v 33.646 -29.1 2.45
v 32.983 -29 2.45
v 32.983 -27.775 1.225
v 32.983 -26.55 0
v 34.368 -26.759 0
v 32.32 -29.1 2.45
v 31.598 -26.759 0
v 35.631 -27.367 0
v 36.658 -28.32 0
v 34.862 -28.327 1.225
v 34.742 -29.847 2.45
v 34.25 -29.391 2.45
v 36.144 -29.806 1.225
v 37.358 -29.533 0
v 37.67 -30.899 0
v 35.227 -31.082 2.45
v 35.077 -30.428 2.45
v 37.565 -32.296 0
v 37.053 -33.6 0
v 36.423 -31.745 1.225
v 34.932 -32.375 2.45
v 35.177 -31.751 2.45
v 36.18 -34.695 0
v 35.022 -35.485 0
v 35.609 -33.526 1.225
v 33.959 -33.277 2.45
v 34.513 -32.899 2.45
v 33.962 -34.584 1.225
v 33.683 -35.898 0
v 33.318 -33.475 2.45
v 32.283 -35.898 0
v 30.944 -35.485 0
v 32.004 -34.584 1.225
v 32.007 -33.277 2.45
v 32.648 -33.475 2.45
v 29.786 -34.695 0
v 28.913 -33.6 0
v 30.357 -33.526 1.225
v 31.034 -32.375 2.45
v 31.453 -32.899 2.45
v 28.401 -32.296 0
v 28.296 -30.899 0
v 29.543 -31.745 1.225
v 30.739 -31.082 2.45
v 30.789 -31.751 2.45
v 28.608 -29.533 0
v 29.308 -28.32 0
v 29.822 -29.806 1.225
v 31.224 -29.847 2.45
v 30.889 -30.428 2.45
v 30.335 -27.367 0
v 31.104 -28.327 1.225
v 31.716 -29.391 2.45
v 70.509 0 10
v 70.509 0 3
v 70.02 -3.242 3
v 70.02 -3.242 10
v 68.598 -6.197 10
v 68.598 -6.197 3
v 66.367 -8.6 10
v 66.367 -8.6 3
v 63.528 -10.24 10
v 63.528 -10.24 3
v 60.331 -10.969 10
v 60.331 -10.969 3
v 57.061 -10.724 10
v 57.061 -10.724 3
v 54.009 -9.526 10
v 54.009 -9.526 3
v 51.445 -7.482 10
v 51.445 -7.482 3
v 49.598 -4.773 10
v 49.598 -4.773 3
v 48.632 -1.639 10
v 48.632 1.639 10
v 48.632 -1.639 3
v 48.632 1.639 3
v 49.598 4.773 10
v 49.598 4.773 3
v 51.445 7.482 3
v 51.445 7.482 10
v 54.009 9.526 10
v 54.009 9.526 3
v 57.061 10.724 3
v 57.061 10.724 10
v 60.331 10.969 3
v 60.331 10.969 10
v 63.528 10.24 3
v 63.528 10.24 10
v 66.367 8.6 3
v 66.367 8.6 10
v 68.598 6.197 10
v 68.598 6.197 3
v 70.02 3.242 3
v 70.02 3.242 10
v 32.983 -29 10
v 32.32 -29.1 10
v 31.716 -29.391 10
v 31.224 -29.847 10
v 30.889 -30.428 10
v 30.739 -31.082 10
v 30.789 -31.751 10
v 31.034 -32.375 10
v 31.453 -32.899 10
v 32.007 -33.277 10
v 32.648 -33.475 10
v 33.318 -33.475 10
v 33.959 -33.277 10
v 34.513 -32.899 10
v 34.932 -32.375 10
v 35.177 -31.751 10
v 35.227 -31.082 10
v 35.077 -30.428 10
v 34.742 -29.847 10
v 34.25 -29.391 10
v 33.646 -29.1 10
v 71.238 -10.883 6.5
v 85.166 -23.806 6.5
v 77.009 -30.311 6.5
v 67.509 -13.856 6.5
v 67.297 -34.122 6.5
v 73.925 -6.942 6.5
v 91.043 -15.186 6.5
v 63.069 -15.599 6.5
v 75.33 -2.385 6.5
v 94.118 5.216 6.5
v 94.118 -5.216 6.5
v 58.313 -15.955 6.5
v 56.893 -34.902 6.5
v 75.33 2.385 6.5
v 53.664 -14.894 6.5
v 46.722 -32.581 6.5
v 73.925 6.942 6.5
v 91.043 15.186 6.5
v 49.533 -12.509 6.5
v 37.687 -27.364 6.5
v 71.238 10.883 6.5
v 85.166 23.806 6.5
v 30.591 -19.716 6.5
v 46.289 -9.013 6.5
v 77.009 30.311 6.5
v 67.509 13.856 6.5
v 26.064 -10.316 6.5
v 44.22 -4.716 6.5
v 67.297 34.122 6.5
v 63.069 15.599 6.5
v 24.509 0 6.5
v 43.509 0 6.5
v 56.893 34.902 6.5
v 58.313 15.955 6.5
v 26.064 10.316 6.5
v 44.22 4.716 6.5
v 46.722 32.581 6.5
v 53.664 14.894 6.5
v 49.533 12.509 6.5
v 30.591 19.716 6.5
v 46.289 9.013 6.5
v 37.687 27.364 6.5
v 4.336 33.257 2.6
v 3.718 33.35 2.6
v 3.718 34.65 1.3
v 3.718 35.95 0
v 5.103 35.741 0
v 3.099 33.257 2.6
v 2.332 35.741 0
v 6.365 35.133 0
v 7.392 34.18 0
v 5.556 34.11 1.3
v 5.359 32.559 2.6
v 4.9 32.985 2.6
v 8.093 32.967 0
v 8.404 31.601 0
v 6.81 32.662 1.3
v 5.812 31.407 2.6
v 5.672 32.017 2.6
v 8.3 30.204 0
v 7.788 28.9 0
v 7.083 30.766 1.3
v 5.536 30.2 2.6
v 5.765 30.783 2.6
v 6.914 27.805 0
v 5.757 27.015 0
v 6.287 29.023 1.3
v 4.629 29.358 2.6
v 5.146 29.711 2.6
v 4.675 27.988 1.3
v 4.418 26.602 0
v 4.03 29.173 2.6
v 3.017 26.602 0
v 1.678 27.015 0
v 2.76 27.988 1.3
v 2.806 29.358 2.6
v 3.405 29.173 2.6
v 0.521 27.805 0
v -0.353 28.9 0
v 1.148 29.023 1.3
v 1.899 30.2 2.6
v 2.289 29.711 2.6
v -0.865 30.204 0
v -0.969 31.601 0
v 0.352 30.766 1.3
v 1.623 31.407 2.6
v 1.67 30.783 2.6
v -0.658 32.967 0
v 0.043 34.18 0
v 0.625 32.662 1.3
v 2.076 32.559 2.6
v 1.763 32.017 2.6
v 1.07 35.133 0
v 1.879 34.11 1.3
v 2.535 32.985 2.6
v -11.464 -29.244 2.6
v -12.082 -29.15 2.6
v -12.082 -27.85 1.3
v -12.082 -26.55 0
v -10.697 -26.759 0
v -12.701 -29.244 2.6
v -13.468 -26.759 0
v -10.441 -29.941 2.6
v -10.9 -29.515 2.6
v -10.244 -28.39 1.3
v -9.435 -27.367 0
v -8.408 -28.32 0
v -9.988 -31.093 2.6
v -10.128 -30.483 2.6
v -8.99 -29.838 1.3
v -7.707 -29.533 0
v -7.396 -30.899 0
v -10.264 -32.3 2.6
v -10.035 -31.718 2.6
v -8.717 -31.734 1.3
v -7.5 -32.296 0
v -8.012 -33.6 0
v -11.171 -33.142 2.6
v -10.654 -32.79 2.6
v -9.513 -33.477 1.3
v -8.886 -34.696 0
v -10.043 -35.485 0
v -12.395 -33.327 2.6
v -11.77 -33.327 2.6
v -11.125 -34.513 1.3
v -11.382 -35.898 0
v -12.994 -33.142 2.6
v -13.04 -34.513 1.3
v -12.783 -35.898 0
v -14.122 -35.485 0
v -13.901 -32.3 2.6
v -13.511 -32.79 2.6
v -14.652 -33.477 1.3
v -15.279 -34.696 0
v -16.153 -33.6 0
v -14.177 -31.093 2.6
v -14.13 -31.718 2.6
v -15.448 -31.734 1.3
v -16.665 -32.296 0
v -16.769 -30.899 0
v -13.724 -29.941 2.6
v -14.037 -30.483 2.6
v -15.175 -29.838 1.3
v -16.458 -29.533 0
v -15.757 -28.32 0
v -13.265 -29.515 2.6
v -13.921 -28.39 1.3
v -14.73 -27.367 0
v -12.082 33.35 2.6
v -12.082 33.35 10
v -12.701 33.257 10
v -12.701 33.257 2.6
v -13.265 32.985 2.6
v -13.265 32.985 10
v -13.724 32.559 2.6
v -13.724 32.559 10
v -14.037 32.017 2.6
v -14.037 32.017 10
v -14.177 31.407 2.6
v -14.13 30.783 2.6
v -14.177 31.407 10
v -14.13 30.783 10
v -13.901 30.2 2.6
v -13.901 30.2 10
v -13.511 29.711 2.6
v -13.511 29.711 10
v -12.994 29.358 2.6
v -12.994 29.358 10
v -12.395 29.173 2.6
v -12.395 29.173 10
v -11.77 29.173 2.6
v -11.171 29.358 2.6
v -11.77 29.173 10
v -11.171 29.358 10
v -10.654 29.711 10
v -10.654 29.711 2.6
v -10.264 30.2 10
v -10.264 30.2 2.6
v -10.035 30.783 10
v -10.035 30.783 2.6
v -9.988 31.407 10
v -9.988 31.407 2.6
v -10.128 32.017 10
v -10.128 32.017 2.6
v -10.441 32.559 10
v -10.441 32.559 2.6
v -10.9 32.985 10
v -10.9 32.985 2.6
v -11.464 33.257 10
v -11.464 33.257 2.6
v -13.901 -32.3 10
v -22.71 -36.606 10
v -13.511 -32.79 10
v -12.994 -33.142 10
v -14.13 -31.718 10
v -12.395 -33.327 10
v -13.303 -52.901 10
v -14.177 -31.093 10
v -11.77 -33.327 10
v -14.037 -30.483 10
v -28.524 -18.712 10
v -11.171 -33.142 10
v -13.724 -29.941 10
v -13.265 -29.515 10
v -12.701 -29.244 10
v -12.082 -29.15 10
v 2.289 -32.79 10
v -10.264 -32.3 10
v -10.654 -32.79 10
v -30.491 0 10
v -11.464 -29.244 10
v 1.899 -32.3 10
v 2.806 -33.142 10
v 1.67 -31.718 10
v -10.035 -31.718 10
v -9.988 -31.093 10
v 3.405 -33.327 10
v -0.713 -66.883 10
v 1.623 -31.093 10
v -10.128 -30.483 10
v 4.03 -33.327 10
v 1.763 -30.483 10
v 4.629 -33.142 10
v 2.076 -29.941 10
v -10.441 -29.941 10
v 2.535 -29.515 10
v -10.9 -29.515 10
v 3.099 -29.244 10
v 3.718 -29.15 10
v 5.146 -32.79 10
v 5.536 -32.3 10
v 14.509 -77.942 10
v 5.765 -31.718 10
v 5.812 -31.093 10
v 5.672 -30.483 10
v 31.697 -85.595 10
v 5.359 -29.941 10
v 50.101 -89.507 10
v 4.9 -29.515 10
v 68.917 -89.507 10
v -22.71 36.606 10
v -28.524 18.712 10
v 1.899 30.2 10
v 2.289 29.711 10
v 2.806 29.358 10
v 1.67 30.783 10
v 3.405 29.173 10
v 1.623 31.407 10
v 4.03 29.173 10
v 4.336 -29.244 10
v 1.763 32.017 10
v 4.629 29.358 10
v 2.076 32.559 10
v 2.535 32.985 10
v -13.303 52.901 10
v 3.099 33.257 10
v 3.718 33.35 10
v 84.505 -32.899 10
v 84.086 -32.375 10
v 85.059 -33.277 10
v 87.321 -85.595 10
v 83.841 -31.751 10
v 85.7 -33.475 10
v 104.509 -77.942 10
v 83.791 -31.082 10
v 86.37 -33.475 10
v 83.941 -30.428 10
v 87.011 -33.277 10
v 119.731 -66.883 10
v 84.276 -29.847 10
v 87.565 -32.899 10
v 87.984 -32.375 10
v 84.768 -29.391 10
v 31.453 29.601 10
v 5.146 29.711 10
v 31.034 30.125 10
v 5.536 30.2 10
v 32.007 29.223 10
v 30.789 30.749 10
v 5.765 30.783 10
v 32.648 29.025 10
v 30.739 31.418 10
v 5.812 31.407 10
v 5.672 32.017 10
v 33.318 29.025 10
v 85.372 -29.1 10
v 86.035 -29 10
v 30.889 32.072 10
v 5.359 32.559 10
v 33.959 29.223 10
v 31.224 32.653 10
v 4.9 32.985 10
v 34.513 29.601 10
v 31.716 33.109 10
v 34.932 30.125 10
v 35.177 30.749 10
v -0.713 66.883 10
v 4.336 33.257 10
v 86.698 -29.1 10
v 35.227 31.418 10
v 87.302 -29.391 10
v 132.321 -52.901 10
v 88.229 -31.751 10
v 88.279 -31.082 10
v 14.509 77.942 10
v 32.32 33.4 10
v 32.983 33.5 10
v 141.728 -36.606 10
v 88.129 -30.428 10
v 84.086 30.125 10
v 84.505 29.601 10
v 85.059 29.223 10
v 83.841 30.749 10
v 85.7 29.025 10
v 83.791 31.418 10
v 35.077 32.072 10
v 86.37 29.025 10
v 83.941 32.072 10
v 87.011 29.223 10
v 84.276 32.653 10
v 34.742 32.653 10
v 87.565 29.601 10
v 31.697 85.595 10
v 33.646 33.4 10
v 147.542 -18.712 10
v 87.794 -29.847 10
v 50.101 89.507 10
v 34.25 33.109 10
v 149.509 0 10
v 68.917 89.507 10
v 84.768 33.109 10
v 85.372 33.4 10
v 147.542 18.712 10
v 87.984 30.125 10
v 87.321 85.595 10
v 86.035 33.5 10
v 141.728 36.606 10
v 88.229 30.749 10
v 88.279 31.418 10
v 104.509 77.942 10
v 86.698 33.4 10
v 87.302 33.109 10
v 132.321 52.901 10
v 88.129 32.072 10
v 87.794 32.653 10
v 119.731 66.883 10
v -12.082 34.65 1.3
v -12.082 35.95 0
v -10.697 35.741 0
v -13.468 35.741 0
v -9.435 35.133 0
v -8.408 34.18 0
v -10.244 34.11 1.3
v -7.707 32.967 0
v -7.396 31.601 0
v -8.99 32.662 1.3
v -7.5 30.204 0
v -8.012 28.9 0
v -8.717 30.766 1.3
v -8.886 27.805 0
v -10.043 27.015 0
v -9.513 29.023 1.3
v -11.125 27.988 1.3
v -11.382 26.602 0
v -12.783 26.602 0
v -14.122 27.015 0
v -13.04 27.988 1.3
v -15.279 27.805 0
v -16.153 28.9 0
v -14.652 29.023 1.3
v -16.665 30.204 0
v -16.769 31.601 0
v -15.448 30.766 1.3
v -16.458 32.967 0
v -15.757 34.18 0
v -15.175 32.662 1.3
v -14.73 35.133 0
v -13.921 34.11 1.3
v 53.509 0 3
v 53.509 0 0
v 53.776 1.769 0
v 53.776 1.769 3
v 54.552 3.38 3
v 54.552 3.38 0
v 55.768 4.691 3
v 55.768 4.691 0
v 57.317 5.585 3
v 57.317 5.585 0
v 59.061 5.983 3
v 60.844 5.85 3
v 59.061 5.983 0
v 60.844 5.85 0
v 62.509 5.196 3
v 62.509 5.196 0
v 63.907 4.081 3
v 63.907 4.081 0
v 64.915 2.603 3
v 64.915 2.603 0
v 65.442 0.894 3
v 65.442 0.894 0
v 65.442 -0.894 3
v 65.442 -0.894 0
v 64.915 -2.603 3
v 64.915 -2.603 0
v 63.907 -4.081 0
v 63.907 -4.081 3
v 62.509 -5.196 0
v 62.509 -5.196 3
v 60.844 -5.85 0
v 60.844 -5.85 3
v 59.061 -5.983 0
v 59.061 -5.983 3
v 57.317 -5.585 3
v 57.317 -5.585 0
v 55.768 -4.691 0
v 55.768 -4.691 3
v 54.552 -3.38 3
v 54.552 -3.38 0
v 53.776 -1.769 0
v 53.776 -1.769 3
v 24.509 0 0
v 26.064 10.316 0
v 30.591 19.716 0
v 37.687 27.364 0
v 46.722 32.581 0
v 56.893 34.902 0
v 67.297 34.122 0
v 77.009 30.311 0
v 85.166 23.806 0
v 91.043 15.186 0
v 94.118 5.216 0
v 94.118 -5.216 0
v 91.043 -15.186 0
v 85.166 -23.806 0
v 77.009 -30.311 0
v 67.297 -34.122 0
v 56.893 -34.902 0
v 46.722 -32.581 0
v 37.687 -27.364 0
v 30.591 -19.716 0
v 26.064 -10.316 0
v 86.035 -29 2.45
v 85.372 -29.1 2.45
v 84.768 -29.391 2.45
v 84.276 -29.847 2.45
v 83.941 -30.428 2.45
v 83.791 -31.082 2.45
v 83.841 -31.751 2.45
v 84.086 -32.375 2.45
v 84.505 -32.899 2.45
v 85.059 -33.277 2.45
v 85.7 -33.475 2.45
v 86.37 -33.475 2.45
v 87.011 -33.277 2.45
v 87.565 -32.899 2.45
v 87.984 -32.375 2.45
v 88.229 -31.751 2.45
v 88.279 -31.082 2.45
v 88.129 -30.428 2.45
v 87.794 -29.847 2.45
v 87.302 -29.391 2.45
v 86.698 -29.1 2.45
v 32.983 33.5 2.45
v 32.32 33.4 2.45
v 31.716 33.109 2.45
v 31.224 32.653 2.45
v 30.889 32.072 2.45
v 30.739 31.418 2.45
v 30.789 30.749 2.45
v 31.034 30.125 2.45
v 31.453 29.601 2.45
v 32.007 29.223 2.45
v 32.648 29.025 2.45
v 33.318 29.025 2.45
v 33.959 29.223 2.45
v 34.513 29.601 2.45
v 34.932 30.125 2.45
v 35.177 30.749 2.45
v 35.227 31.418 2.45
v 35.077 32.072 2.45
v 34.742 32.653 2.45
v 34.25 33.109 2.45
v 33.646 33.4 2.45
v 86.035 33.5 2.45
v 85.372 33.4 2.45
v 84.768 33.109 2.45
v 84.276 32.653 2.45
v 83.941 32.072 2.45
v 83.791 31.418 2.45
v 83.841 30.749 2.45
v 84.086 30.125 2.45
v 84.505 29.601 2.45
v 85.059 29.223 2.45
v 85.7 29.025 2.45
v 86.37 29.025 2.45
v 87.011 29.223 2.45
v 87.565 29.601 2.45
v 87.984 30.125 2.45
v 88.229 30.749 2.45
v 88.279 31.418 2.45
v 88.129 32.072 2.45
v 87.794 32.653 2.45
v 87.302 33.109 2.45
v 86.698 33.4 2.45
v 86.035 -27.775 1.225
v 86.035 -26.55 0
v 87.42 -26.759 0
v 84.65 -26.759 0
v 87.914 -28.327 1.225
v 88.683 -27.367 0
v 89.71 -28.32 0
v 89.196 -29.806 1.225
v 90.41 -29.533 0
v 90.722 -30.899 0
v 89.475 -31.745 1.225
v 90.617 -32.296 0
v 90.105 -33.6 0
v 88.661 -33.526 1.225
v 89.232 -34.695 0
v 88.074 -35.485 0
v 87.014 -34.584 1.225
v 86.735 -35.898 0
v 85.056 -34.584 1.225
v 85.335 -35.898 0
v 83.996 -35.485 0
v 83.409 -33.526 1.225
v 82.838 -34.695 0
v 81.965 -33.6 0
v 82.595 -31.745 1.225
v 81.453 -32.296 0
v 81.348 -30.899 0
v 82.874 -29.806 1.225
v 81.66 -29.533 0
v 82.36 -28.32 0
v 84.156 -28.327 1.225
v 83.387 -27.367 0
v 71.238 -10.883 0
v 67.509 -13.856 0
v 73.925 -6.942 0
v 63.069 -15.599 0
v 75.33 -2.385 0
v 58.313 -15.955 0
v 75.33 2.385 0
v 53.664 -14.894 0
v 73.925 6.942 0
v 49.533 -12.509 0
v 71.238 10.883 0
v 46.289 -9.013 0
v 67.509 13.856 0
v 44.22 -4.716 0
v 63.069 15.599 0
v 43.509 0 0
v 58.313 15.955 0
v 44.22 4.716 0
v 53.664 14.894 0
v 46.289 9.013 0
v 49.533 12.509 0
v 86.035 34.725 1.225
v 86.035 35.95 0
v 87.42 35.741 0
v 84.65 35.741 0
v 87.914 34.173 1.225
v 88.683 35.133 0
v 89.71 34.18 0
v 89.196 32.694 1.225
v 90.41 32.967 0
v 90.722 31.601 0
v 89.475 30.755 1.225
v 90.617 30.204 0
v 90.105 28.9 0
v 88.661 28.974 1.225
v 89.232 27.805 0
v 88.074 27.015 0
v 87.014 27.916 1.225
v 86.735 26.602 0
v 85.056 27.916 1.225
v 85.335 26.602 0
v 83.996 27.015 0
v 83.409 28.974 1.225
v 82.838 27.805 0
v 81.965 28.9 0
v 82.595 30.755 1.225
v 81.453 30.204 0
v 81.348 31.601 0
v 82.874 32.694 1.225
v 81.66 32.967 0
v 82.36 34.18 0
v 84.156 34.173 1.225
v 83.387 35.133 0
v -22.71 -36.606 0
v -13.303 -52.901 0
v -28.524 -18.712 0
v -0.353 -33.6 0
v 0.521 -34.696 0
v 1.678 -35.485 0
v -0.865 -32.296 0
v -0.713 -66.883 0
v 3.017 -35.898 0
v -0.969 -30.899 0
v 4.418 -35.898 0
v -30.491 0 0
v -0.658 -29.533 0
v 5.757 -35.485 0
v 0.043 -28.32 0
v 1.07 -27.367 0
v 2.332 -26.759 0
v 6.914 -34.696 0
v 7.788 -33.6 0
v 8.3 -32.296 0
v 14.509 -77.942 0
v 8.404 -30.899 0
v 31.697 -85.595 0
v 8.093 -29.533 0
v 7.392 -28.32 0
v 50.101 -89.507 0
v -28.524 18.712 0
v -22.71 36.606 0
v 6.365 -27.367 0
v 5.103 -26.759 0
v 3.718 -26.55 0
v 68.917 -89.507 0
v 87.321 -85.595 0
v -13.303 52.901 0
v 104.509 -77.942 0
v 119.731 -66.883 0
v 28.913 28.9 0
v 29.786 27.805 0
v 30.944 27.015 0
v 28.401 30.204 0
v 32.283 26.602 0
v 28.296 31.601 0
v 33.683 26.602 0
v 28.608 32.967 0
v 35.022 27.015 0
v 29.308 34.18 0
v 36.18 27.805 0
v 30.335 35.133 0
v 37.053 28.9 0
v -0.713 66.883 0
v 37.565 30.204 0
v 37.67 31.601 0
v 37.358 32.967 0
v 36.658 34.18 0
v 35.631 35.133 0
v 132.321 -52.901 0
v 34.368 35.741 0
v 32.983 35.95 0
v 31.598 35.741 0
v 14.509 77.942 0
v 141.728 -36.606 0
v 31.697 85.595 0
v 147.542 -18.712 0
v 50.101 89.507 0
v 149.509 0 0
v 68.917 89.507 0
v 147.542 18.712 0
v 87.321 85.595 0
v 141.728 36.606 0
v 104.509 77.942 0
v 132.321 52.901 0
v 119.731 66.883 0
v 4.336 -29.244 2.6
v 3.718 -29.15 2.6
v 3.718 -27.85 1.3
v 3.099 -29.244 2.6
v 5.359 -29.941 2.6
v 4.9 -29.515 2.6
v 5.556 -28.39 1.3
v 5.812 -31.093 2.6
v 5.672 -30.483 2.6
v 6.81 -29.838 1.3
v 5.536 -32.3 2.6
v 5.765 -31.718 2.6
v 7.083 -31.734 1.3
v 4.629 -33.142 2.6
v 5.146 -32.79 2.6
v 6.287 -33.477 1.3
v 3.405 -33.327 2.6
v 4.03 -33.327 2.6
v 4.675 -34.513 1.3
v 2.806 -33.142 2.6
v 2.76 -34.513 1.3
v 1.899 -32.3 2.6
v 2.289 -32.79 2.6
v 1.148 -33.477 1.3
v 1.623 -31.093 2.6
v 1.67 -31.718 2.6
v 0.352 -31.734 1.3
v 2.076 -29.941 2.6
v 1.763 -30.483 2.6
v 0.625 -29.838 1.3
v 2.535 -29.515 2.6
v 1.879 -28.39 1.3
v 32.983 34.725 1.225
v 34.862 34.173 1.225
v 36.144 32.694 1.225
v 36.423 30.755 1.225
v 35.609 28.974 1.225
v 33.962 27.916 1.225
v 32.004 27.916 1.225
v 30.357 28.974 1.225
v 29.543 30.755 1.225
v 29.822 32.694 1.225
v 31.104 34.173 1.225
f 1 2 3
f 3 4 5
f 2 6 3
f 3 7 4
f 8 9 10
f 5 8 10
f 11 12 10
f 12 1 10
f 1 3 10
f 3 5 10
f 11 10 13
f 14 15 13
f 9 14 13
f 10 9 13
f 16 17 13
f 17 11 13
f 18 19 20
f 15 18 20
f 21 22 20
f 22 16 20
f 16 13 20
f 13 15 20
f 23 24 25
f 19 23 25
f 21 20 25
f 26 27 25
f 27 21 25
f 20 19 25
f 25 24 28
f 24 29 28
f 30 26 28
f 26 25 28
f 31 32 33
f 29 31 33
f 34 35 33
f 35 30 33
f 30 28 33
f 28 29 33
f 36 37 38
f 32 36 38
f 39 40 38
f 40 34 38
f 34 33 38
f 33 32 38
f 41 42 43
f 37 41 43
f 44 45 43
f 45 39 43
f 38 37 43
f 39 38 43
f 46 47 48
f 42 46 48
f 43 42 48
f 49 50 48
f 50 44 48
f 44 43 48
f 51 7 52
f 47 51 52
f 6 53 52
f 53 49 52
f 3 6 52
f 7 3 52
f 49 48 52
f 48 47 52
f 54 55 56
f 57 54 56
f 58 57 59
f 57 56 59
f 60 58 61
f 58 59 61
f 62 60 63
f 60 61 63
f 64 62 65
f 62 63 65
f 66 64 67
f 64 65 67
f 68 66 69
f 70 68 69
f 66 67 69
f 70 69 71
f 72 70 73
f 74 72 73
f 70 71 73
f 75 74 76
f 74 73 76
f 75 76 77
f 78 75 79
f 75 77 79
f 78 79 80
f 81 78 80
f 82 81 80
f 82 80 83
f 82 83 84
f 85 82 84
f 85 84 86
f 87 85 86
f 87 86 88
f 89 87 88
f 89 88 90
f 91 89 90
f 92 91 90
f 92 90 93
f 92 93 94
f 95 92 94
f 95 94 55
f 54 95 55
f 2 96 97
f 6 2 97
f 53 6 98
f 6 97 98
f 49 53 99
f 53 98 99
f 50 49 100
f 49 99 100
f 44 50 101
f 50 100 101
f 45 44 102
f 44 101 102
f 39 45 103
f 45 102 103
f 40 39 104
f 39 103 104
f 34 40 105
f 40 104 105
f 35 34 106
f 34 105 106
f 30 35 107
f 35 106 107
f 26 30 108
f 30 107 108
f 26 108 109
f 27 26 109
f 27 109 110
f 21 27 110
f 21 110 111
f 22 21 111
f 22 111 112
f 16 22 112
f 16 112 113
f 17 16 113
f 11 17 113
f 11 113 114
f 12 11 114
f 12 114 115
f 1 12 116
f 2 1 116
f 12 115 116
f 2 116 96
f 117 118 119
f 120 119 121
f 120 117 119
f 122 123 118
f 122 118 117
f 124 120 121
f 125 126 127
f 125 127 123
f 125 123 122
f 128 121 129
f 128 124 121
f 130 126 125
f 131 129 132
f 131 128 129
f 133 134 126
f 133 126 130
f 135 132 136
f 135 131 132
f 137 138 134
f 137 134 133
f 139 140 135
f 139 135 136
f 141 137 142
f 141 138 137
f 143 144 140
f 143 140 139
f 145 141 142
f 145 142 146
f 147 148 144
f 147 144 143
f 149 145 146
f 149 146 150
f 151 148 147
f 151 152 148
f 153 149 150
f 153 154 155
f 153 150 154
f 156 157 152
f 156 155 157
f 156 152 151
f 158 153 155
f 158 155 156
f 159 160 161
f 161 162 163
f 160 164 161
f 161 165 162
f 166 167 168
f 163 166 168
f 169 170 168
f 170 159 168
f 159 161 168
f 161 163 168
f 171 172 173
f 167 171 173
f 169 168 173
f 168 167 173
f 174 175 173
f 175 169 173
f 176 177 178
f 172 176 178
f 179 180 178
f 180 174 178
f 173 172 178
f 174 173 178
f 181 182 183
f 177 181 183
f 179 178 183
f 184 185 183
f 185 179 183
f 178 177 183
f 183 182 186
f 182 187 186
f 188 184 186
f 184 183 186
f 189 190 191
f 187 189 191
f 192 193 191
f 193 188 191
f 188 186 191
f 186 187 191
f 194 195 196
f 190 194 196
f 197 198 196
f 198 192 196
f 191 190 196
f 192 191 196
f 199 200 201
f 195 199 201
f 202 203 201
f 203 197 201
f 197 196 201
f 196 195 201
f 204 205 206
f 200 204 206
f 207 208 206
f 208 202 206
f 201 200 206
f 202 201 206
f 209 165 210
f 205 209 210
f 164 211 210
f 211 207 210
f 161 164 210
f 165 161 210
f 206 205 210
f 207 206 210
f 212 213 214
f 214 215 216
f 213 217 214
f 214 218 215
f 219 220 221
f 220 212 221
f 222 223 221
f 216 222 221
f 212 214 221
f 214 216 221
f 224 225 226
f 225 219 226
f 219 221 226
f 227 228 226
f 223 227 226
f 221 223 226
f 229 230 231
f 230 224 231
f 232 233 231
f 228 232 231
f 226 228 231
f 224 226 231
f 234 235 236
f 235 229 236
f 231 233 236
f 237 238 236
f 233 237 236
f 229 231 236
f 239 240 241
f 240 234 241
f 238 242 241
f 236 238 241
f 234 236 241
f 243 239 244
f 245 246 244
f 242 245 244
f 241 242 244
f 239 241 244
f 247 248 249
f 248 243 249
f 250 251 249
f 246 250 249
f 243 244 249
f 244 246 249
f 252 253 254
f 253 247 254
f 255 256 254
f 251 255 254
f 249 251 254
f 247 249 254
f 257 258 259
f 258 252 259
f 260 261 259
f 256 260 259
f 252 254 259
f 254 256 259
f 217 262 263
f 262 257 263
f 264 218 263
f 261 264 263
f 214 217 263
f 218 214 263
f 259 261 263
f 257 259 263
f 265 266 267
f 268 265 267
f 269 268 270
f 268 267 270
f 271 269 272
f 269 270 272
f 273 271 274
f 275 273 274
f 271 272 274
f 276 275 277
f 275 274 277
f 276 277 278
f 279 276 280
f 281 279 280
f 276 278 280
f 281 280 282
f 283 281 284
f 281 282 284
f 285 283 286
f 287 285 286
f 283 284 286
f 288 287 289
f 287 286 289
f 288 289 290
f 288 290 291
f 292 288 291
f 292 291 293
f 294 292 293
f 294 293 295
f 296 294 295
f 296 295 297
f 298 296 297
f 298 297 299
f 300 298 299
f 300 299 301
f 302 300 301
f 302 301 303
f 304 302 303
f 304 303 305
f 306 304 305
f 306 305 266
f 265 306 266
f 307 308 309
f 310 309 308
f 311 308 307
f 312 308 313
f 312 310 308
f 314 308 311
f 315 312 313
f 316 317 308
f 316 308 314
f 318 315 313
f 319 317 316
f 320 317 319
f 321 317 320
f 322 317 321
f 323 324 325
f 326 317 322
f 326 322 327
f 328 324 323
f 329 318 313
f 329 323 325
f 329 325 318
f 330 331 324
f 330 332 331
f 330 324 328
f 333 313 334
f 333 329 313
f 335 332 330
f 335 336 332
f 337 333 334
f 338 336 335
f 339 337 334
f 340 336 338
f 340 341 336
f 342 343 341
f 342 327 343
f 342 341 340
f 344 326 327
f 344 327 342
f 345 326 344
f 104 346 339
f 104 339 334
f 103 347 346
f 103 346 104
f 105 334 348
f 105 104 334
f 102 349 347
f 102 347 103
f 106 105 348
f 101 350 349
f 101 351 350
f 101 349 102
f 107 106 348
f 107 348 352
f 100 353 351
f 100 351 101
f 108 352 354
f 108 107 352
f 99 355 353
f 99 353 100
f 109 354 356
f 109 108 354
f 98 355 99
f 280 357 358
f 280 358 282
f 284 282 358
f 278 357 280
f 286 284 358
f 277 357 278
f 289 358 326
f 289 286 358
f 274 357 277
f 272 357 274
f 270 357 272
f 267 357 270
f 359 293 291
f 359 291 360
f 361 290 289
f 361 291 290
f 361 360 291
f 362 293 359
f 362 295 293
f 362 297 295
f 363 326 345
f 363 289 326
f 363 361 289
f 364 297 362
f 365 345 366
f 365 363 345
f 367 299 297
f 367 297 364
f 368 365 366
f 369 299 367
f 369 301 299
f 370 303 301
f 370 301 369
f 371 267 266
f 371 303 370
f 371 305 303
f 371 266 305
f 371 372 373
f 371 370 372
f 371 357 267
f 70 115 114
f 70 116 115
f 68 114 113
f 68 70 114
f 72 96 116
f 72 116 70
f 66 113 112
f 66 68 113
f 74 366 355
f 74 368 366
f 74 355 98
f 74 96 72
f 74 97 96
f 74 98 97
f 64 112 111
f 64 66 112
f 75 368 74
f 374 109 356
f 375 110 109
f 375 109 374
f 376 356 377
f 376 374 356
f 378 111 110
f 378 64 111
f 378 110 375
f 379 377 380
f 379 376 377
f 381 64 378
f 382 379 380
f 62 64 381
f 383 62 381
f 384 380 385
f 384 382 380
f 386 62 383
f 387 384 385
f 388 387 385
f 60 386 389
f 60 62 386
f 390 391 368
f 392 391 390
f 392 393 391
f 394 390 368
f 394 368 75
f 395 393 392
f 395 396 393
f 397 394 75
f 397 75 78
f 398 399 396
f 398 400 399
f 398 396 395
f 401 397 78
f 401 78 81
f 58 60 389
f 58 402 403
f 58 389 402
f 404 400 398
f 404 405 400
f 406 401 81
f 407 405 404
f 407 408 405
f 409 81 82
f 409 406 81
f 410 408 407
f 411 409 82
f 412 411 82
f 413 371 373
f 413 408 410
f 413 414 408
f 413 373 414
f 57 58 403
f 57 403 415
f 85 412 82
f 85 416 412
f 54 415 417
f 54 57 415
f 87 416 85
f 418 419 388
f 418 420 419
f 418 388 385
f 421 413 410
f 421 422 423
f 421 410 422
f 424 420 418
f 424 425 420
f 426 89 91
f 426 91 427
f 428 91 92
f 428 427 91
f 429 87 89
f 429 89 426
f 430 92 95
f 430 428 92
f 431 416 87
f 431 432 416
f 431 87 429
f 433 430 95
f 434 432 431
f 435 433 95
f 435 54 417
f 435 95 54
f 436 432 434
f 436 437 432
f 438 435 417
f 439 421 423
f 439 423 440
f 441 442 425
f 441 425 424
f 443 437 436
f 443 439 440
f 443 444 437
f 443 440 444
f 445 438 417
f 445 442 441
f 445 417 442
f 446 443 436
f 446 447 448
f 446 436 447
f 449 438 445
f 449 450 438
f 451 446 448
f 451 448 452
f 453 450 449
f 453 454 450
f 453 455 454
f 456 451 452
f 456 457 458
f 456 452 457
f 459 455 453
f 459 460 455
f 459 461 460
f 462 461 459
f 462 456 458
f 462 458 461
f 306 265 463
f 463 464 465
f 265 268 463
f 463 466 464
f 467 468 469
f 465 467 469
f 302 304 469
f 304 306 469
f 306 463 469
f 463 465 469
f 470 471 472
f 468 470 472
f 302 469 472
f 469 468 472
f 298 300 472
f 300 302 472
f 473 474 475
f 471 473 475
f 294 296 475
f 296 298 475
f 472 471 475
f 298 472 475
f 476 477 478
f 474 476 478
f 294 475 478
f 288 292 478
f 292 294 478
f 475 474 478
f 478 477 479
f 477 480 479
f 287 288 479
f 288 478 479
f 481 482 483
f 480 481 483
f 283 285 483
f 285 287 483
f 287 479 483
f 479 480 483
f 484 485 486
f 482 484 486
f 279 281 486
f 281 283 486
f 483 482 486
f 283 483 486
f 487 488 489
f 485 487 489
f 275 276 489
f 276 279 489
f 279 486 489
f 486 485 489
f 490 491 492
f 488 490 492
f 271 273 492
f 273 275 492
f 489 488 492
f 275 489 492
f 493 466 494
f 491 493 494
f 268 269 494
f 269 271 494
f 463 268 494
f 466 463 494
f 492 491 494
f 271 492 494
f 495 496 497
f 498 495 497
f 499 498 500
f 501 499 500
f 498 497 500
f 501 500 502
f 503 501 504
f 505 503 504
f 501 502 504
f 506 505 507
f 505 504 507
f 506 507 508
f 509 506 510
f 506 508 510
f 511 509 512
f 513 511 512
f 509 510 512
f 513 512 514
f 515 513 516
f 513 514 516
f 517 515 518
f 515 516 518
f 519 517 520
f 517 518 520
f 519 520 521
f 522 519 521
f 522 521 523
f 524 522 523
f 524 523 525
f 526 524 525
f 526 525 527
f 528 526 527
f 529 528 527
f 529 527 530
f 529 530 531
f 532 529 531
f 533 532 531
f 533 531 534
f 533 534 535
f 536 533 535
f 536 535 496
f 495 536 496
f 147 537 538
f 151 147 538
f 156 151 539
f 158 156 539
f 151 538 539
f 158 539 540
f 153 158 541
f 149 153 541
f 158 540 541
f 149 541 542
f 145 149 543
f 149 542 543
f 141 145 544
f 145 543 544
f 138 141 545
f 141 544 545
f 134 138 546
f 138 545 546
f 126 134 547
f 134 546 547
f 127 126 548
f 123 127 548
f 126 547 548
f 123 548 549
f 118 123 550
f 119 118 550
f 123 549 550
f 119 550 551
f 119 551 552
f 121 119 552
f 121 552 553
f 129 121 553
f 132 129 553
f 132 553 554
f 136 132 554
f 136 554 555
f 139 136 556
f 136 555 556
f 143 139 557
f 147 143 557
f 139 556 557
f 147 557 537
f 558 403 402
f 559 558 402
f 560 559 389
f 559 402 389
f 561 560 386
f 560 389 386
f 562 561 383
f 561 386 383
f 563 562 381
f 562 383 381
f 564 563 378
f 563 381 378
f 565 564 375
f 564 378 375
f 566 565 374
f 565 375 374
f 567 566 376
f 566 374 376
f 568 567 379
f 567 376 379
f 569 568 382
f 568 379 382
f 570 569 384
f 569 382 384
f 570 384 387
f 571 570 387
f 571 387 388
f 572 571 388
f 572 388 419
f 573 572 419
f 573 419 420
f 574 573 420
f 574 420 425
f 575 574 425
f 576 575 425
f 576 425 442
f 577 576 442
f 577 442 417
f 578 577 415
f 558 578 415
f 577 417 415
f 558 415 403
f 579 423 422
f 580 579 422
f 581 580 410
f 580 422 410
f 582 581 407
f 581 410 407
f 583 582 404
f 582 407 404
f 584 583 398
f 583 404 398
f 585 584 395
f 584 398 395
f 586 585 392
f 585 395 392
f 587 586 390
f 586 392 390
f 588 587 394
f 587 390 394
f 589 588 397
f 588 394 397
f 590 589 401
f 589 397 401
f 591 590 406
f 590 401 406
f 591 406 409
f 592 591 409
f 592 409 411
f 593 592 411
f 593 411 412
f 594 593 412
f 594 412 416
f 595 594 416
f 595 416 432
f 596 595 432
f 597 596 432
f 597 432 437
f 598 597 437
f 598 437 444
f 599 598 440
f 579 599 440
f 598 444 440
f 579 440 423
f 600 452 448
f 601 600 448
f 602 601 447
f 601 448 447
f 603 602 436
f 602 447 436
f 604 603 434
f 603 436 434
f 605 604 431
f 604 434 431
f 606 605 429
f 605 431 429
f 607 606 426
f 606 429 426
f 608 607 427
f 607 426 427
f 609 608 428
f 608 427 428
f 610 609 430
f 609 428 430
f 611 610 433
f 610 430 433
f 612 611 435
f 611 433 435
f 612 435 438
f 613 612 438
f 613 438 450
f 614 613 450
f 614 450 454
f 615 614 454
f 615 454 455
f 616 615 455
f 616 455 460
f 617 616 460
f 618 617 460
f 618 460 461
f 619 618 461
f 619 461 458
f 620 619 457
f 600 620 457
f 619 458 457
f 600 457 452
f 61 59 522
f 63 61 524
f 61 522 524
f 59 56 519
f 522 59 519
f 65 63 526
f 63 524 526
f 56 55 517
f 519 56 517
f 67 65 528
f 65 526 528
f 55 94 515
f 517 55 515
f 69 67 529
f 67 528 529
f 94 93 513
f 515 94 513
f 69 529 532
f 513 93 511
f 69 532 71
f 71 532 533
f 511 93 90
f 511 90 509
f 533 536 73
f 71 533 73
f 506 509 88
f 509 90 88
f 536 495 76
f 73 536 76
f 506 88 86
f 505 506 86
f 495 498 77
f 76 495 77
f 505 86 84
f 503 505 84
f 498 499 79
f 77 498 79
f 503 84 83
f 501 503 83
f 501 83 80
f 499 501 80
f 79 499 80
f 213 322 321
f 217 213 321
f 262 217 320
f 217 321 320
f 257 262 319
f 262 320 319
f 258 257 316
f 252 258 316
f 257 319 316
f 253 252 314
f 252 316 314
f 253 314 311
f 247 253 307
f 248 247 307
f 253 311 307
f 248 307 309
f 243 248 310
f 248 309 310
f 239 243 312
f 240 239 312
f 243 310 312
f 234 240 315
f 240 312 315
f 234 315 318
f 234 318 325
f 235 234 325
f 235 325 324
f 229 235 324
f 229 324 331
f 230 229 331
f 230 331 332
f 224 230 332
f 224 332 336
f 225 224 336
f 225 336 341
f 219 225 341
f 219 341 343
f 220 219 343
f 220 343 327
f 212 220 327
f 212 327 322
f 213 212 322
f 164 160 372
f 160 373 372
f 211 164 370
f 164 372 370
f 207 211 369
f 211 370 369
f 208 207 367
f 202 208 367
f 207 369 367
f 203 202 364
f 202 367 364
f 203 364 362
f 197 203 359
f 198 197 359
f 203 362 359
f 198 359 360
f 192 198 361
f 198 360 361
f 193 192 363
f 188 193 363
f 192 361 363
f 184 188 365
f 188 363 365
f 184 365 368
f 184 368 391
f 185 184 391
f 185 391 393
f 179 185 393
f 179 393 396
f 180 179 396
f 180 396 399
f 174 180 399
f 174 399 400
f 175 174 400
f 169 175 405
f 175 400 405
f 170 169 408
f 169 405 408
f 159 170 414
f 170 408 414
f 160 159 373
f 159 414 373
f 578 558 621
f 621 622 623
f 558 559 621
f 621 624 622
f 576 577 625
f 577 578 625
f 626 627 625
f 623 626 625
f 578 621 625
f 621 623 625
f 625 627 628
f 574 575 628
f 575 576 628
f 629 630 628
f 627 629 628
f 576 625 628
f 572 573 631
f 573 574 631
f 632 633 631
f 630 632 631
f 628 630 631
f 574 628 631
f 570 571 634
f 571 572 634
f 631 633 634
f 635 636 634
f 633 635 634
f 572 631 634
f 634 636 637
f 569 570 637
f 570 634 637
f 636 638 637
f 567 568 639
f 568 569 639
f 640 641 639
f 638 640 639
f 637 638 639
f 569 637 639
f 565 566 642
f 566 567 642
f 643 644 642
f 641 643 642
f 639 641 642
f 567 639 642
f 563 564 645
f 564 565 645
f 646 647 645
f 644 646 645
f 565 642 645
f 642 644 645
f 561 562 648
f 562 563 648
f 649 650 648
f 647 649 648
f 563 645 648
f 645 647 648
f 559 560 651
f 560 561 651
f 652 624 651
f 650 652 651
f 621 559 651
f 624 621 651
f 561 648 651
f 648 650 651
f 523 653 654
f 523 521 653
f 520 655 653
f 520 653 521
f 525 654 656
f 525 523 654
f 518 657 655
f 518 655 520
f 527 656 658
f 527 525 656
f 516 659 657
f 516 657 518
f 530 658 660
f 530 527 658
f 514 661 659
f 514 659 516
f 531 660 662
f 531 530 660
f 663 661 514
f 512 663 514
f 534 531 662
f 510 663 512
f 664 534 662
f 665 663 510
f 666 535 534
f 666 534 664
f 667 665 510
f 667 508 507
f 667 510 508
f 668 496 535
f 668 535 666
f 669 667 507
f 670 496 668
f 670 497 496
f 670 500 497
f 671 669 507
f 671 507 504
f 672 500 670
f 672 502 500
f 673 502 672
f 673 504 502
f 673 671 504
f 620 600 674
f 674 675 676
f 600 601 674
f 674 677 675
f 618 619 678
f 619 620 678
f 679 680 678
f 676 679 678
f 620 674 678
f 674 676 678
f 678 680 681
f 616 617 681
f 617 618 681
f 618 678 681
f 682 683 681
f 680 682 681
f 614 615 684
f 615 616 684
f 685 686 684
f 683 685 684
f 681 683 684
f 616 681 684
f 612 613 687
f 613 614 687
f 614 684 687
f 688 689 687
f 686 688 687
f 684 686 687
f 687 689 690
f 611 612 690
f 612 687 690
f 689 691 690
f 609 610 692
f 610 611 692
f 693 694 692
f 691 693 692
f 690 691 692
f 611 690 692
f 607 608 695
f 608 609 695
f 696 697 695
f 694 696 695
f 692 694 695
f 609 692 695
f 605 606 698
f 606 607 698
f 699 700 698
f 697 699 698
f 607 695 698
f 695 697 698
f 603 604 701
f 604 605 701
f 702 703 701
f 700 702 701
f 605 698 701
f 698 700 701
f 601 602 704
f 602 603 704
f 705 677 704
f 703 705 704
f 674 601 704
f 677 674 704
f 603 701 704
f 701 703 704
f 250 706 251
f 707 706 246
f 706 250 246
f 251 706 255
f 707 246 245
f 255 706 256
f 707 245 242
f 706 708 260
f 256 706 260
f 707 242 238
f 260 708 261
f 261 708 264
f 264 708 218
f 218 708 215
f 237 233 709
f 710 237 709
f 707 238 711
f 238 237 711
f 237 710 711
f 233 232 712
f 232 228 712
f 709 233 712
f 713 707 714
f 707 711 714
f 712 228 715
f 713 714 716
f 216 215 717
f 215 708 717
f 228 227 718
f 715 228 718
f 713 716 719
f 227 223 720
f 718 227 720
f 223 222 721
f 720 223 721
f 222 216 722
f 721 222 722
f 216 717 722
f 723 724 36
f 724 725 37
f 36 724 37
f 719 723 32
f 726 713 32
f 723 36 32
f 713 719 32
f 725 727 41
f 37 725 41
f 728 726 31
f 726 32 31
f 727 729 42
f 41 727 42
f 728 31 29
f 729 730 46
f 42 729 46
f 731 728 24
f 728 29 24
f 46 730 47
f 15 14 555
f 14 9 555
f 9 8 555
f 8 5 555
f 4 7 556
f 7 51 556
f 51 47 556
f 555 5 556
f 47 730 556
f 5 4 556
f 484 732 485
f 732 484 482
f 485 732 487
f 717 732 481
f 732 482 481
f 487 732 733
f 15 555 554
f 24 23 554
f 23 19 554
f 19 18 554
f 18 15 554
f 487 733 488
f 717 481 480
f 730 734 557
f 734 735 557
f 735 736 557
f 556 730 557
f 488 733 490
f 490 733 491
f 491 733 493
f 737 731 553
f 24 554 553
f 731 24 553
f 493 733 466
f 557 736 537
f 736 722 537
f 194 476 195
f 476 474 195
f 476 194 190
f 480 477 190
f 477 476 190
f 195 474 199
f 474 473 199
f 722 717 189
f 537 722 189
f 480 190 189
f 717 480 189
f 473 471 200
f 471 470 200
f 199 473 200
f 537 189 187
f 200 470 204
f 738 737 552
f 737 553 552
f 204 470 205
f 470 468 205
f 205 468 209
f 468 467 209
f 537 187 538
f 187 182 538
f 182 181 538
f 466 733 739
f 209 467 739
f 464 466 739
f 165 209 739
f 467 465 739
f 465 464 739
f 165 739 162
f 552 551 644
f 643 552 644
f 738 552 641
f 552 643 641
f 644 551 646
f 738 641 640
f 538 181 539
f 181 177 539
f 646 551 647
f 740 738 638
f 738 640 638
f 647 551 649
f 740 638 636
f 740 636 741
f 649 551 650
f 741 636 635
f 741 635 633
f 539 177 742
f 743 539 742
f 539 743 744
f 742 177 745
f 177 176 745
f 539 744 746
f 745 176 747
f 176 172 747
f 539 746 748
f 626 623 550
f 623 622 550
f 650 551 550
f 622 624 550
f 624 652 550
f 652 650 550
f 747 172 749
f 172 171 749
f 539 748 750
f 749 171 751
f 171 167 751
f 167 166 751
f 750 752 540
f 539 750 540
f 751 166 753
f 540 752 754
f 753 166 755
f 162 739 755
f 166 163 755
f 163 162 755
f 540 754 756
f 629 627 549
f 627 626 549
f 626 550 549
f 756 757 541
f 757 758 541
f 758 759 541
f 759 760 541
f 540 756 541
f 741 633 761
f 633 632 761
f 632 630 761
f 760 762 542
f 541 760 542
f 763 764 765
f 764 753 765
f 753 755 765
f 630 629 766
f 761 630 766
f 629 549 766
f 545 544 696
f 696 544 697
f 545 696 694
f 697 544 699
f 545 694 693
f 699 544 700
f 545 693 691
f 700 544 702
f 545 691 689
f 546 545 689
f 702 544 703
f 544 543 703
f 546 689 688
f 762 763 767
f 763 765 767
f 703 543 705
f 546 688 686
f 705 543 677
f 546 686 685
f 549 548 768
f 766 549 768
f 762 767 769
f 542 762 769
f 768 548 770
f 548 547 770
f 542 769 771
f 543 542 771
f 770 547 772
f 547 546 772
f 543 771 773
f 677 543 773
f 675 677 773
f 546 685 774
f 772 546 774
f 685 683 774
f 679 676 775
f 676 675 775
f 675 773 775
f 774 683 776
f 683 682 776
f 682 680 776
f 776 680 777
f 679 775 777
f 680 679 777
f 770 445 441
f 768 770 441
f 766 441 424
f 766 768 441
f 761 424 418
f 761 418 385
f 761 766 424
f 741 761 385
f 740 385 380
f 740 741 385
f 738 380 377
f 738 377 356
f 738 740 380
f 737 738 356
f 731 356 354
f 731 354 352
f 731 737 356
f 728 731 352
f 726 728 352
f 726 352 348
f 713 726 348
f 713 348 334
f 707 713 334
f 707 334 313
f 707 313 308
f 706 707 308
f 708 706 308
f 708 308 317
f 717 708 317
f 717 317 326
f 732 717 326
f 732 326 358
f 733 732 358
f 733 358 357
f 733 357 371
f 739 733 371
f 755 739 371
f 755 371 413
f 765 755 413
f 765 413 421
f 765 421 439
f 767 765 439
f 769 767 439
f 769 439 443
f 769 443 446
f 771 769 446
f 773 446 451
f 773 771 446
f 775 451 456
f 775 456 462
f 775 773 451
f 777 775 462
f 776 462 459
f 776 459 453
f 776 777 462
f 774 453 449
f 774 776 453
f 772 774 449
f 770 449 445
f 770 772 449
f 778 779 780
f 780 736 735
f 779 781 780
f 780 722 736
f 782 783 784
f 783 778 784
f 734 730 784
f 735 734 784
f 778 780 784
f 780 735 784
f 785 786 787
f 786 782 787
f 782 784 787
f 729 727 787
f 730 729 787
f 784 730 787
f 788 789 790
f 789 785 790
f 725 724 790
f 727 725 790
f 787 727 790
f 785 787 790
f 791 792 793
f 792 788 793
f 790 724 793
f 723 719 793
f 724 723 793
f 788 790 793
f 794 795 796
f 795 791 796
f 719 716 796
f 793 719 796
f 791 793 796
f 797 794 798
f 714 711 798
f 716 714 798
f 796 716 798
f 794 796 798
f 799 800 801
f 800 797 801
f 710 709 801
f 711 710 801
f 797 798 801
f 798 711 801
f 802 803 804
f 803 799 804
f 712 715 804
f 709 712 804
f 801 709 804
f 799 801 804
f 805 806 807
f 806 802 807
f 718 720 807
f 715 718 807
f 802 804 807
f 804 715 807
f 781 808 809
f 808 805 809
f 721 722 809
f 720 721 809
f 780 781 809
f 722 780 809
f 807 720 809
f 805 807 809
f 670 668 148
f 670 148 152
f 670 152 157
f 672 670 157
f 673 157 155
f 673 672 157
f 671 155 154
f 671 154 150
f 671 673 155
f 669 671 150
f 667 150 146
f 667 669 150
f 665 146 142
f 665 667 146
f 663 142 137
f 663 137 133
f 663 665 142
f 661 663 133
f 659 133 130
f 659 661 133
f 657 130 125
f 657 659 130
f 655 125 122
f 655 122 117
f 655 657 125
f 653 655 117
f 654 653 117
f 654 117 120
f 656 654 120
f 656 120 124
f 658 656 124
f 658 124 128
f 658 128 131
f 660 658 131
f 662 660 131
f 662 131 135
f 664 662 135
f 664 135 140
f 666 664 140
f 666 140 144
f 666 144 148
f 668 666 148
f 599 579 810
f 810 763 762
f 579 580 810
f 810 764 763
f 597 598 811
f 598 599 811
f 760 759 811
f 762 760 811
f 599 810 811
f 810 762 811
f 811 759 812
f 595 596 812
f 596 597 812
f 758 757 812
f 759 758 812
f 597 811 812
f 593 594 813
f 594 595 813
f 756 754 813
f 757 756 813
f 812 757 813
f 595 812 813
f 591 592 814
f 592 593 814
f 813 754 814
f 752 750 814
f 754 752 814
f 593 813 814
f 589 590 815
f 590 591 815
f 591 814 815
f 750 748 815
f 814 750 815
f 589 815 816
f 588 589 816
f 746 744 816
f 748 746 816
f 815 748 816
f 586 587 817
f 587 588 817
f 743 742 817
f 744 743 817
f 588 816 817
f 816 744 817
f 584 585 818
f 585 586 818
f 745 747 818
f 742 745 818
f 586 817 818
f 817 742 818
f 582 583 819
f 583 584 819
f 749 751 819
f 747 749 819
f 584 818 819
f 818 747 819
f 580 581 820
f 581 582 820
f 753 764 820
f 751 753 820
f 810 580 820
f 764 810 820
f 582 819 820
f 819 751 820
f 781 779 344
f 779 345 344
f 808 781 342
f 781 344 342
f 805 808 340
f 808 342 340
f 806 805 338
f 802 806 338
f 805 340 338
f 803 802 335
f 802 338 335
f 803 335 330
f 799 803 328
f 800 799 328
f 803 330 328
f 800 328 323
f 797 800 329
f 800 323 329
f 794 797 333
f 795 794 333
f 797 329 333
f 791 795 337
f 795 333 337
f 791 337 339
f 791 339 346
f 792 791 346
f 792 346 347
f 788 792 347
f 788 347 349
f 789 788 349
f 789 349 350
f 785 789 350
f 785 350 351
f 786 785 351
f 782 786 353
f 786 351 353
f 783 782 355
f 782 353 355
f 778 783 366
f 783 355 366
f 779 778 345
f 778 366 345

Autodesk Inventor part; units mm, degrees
ref_plane "YZ Plane" through (0, 0, 0) normal (1, 0, 0) x (0, 1, 0)
ref_plane "XZ Plane" through (0, 0, 0) normal (0, 1, 0) x (-1, 0, 0)
ref_plane "XY Plane" through (0, 0, 0) normal (0, 0, 1) x (1, 0, 0)
sketch "Sketch1" plane through (0, 0, 0) normal (0, 0, 1) x (1, 0, 0)
  circle A0 centre (-11.3135, -11.3135) radius 2
  circle A1 centre (-11.3135, 11.3135) radius 2
  circle A2 centre (11.3135, 11.3135) radius 2
  circle A3 centre (11.3135, -11.3135) radius 2
  circle A4 centre (-15.3135, 11.3135) radius 2
  circle A5 centre (-7.3135, 11.3135) radius 2
  circle A6 centre (7.3135, 11.3135) radius 2
  circle A7 centre (15.3135, 11.3135) radius 2
  circle A8 centre (15.3135, -11.3135) radius 2
  circle A9 centre (7.3135, -11.3135) radius 2
  circle A10 centre (-7.3135, -11.3135) radius 2
  circle A11 centre (-15.3135, -11.3135) radius 2
  line L0 (-15.3135, 13.3135) -> (-7.3135, 13.3135)
  line L1 (-7.3135, 9.3135) -> (-15.3135, 9.3135)
  line L2 (-15.3135, -9.3135) -> (-7.3135, -9.3135)
  line L3 (-7.3135, -13.3135) -> (-15.3135, -13.3135)
  line L4 (7.3135, -9.3135) -> (15.3135, -9.3135)
  line L5 (15.3135, -13.3135) -> (7.3135, -13.3135)
  line L6 (15.3135, 9.3135) -> (7.3135, 9.3135)
  line L7 (15.3135, 13.3135) -> (7.3135, 13.3135)
  circle A12 centre (0, 0) radius 8.25
  circle A13 centre (5, 0) radius 8.25
  circle A14 centre (-5, 0) radius 8.25
  line L8 (-5, 8.25) -> (5, 8.25)
  line L9 (5, -8.25) -> (-5, -8.25)
  circle A15 centre (0, 0) radius 42.5
  circle A16 centre (59.509, 0) radius 50.7821
  line L10 (-5.9149, 42.0864) -> (52.4415, 50.2878)
  line L11 (-5.9149, -42.0864) -> (52.4415, -50.2878)
  line L12 (-13.25, 0) -> (13.25, 0)
  circle A17 centre (59.509, 0) radius 11
  arc A18 (-5.9149, 42.0864) -> (-5.9149, -42.0864) centre (0, 0) ccw
  line L13 (-42.5, 0) -> (156.5802, 0)
  circle A19 centre (59.509, 0) radius 90
  point P0 (-3.1314, -32.3793)
  point P1 (23.2633, -35.5678)
  point P2 (23.2633, 35.5678)
  point P3 (-2.5, -7.8621)
  point P4 (0, -8.25)
  dimension "d0" = 4
  dimension "d1" = 22.627
  dimension "d2" = 22.627
  dimension "d3" = 11.3135
  dimension "d4" = 11.3135
  dimension "d5" = 4
  dimension "d6" = 4
  dimension "d7" = 4
  dimension "d8" = 4
  dimension "d9" = 4
  dimension "d10" = 4
  dimension "d11" = 4
  dimension "d12" = 4
  dimension "d15" = 16.5
  dimension "d16" = 5
  dimension "d17" = 5
  dimension "d18" = 85
  dimension "d19" = 8
  dimension "d20" = 59.509
  dimension "d21" = 22
  dimension "d24" = 85
  dimension "d116" = 180
extrude "Extrusion1" add sketch "Sketch1" along normal blind 10 contours A0 | A10 L3 A0 | A0 L2 A10 | A10 | A0 A11 L2 | L3 A11 A0 | A11 | A1 | A5 L1 A1 | A1 L0 A5 | A5 | A1 A4 L0 | L1 A4 A1 | A4 | A2 A16 | A7 L6 A2 | A2 L7 A7 | A7 | L7 A16 A15 L13 A13 L6 A7 | A2 A16 L7 | L6 A16 A2 | A16 A2 | A2 A6 L7 A16 | L7 A6 L6 A16 A13 L8 A14 L13 A19 A15 | A16 L6 A6 A2 | A6 | A16 L13 A17 A15 | A15 L10 A16 | A16 L12 A12 A13 | A13 L12 A16 | L13 A17 A16 A15 | A15 A16 L5 A8 L4 A13 L13 | A15 A19 L13 A16 L10 | A13 A16 L12 | A13 A12 L8 | A16 A13 A12 L12 | A16 L11 A15 | A15 A19 L13 A14 L9 A13 A16 L4 A9 L5 | L13 A19 A15 L11 A16 | A13 A14 A12 | A12 L12 A14 A13 | A12 A14 L8 | A12 A13 A14 L12 | A16 A3 L5 | L5 A9 A3 A16 | L9 A12 A13 | A16 A3 A9 L4 | L4 A3 A16 | A14 L12 A13 | A13 L12 A12 A14 | A12 L12 A14 | A12 A14 A13 | A14 A13 L12 | A3 A16 | A3 A8 L5 | A9 | A3 A16 | L12 A12 A14 | L9 A14 A12 | L4 A8 A3 | A13 A14 A12 L12 | A8
sketch "Sketch18" plane through (59.509, 0, 0) normal (0, 0, -1) x (-1, 0, 0)
  circle A0 centre (0, 0) radius 35
  circle A1 centre (0, 0) radius 90 projected
  circle A2 centre (0, 0) radius 11 projected
  circle A3 centre (0, 0) radius 16
  point P0 (59.509, 0)
  dimension "d127" = 70
  dimension "d130" = 5
extrude "Extrusion9" cut sketch "Sketch18" against normal blind 6.5 contours A0 | A2
sketch "Sketch20" plane through (59.509, 0, 0) normal (0, 0, -1) x (-1, 0, 0)
  circle A0 centre (0, 0) radius 11 projected
  circle A1 centre (0, 0) radius 11 projected
  circle A2 centre (0, 0) radius 6
  point P0 (59.509, 0)
  dimension "d136" = 12
extrude "Extrusion11" add sketch "Sketch20" against normal blind 3
sketch "Sketch22" plane through (59.509, 0, 0) normal (0, 0, -1) x (-1, 0, 0)
  circle A0 centre (55.7915, 31.25) radius 1.621 projected
  circle A1 centre (71.5915, 31.25) radius 1.621 projected
  circle A2 centre (71.5915, -31.2504) radius 1.621 projected
  circle A3 centre (55.7915, -31.2504) radius 1.621 projected
  circle A4 centre (71.5915, -31.2504) radius 1.621 projected
  circle A5 centre (55.7915, -31.2504) radius 1.621 projected
  circle A6 centre (71.5915, 31.25) radius 1.621 projected
  circle A7 centre (55.7915, 31.25) radius 1.621 projected
  point P0 (59.509, 0)
hole "Hole4" at (-12.0825, 31.25, 0) at (3.7175, 31.25, 0) at (-12.0825, -31.2504, 0) at (3.7175, -31.2504, 0) direction (0, 0, 1) diameter 4.2 end through all countersink diameter 9.4 countersink angle 90 clearance for "Countersunk Flat Head Screw ISO 2009/7046" size "M4" standard "ISO"
sketch "Sketch23" plane through (59.509, 0, 0) normal (0, 0, -1) x (-1, 0, 0)
  circle A0 centre (-26.526, -31.25) radius 2.4585 projected
  circle A1 centre (26.526, -31.25) radius 2.4585 projected
  circle A2 centre (-26.526, 31.25) radius 1.621 projected
  circle A3 centre (26.526, 31.25) radius 1.621 projected
  circle A4 centre (26.526, -31.25) radius 2.4585 projected
  circle A5 centre (26.526, 31.25) radius 1.621 projected
  circle A6 centre (-26.526, -31.25) radius 2.4585 projected
  circle A7 centre (0, 0) radius 90 projected
  circle A8 centre (0, 0) radius 11 projected
  circle A9 centre (-26.526, 31.25) radius 1.621 projected
  point P0 (59.509, 0)
hole "Hole5" at (86.035, 31.25, 0) at (86.035, -31.25, 0) at (32.983, -31.25, 0) at (32.983, 31.25, 0) direction (0, 0, 1) diameter 4.5 depth 14.2 tip angle 118 countersink diameter 9.4 countersink angle 90 clearance for "Countersunk Flat Head Screw ISO 2009/7046" size "M4" standard "ISO"
equation "\"d2\" = d1"
equation "\"d3\" = 0.5 * d2"
equation "\"d4\" = 0.5 * d1"
equation "\"d5\" = d0"
equation "\"d6\" = d5"
equation "\"d7\" = d6"
equation "\"d8\" = d7"
equation "\"d9\" = d5"
equation "\"d10\" = d9"
equation "\"d11\" = d10"
equation "\"d12\" = d11"
equation "\"d17\" = d16"
properties part number "base bovenkant 10 mm" material "Aluminum 6061"
